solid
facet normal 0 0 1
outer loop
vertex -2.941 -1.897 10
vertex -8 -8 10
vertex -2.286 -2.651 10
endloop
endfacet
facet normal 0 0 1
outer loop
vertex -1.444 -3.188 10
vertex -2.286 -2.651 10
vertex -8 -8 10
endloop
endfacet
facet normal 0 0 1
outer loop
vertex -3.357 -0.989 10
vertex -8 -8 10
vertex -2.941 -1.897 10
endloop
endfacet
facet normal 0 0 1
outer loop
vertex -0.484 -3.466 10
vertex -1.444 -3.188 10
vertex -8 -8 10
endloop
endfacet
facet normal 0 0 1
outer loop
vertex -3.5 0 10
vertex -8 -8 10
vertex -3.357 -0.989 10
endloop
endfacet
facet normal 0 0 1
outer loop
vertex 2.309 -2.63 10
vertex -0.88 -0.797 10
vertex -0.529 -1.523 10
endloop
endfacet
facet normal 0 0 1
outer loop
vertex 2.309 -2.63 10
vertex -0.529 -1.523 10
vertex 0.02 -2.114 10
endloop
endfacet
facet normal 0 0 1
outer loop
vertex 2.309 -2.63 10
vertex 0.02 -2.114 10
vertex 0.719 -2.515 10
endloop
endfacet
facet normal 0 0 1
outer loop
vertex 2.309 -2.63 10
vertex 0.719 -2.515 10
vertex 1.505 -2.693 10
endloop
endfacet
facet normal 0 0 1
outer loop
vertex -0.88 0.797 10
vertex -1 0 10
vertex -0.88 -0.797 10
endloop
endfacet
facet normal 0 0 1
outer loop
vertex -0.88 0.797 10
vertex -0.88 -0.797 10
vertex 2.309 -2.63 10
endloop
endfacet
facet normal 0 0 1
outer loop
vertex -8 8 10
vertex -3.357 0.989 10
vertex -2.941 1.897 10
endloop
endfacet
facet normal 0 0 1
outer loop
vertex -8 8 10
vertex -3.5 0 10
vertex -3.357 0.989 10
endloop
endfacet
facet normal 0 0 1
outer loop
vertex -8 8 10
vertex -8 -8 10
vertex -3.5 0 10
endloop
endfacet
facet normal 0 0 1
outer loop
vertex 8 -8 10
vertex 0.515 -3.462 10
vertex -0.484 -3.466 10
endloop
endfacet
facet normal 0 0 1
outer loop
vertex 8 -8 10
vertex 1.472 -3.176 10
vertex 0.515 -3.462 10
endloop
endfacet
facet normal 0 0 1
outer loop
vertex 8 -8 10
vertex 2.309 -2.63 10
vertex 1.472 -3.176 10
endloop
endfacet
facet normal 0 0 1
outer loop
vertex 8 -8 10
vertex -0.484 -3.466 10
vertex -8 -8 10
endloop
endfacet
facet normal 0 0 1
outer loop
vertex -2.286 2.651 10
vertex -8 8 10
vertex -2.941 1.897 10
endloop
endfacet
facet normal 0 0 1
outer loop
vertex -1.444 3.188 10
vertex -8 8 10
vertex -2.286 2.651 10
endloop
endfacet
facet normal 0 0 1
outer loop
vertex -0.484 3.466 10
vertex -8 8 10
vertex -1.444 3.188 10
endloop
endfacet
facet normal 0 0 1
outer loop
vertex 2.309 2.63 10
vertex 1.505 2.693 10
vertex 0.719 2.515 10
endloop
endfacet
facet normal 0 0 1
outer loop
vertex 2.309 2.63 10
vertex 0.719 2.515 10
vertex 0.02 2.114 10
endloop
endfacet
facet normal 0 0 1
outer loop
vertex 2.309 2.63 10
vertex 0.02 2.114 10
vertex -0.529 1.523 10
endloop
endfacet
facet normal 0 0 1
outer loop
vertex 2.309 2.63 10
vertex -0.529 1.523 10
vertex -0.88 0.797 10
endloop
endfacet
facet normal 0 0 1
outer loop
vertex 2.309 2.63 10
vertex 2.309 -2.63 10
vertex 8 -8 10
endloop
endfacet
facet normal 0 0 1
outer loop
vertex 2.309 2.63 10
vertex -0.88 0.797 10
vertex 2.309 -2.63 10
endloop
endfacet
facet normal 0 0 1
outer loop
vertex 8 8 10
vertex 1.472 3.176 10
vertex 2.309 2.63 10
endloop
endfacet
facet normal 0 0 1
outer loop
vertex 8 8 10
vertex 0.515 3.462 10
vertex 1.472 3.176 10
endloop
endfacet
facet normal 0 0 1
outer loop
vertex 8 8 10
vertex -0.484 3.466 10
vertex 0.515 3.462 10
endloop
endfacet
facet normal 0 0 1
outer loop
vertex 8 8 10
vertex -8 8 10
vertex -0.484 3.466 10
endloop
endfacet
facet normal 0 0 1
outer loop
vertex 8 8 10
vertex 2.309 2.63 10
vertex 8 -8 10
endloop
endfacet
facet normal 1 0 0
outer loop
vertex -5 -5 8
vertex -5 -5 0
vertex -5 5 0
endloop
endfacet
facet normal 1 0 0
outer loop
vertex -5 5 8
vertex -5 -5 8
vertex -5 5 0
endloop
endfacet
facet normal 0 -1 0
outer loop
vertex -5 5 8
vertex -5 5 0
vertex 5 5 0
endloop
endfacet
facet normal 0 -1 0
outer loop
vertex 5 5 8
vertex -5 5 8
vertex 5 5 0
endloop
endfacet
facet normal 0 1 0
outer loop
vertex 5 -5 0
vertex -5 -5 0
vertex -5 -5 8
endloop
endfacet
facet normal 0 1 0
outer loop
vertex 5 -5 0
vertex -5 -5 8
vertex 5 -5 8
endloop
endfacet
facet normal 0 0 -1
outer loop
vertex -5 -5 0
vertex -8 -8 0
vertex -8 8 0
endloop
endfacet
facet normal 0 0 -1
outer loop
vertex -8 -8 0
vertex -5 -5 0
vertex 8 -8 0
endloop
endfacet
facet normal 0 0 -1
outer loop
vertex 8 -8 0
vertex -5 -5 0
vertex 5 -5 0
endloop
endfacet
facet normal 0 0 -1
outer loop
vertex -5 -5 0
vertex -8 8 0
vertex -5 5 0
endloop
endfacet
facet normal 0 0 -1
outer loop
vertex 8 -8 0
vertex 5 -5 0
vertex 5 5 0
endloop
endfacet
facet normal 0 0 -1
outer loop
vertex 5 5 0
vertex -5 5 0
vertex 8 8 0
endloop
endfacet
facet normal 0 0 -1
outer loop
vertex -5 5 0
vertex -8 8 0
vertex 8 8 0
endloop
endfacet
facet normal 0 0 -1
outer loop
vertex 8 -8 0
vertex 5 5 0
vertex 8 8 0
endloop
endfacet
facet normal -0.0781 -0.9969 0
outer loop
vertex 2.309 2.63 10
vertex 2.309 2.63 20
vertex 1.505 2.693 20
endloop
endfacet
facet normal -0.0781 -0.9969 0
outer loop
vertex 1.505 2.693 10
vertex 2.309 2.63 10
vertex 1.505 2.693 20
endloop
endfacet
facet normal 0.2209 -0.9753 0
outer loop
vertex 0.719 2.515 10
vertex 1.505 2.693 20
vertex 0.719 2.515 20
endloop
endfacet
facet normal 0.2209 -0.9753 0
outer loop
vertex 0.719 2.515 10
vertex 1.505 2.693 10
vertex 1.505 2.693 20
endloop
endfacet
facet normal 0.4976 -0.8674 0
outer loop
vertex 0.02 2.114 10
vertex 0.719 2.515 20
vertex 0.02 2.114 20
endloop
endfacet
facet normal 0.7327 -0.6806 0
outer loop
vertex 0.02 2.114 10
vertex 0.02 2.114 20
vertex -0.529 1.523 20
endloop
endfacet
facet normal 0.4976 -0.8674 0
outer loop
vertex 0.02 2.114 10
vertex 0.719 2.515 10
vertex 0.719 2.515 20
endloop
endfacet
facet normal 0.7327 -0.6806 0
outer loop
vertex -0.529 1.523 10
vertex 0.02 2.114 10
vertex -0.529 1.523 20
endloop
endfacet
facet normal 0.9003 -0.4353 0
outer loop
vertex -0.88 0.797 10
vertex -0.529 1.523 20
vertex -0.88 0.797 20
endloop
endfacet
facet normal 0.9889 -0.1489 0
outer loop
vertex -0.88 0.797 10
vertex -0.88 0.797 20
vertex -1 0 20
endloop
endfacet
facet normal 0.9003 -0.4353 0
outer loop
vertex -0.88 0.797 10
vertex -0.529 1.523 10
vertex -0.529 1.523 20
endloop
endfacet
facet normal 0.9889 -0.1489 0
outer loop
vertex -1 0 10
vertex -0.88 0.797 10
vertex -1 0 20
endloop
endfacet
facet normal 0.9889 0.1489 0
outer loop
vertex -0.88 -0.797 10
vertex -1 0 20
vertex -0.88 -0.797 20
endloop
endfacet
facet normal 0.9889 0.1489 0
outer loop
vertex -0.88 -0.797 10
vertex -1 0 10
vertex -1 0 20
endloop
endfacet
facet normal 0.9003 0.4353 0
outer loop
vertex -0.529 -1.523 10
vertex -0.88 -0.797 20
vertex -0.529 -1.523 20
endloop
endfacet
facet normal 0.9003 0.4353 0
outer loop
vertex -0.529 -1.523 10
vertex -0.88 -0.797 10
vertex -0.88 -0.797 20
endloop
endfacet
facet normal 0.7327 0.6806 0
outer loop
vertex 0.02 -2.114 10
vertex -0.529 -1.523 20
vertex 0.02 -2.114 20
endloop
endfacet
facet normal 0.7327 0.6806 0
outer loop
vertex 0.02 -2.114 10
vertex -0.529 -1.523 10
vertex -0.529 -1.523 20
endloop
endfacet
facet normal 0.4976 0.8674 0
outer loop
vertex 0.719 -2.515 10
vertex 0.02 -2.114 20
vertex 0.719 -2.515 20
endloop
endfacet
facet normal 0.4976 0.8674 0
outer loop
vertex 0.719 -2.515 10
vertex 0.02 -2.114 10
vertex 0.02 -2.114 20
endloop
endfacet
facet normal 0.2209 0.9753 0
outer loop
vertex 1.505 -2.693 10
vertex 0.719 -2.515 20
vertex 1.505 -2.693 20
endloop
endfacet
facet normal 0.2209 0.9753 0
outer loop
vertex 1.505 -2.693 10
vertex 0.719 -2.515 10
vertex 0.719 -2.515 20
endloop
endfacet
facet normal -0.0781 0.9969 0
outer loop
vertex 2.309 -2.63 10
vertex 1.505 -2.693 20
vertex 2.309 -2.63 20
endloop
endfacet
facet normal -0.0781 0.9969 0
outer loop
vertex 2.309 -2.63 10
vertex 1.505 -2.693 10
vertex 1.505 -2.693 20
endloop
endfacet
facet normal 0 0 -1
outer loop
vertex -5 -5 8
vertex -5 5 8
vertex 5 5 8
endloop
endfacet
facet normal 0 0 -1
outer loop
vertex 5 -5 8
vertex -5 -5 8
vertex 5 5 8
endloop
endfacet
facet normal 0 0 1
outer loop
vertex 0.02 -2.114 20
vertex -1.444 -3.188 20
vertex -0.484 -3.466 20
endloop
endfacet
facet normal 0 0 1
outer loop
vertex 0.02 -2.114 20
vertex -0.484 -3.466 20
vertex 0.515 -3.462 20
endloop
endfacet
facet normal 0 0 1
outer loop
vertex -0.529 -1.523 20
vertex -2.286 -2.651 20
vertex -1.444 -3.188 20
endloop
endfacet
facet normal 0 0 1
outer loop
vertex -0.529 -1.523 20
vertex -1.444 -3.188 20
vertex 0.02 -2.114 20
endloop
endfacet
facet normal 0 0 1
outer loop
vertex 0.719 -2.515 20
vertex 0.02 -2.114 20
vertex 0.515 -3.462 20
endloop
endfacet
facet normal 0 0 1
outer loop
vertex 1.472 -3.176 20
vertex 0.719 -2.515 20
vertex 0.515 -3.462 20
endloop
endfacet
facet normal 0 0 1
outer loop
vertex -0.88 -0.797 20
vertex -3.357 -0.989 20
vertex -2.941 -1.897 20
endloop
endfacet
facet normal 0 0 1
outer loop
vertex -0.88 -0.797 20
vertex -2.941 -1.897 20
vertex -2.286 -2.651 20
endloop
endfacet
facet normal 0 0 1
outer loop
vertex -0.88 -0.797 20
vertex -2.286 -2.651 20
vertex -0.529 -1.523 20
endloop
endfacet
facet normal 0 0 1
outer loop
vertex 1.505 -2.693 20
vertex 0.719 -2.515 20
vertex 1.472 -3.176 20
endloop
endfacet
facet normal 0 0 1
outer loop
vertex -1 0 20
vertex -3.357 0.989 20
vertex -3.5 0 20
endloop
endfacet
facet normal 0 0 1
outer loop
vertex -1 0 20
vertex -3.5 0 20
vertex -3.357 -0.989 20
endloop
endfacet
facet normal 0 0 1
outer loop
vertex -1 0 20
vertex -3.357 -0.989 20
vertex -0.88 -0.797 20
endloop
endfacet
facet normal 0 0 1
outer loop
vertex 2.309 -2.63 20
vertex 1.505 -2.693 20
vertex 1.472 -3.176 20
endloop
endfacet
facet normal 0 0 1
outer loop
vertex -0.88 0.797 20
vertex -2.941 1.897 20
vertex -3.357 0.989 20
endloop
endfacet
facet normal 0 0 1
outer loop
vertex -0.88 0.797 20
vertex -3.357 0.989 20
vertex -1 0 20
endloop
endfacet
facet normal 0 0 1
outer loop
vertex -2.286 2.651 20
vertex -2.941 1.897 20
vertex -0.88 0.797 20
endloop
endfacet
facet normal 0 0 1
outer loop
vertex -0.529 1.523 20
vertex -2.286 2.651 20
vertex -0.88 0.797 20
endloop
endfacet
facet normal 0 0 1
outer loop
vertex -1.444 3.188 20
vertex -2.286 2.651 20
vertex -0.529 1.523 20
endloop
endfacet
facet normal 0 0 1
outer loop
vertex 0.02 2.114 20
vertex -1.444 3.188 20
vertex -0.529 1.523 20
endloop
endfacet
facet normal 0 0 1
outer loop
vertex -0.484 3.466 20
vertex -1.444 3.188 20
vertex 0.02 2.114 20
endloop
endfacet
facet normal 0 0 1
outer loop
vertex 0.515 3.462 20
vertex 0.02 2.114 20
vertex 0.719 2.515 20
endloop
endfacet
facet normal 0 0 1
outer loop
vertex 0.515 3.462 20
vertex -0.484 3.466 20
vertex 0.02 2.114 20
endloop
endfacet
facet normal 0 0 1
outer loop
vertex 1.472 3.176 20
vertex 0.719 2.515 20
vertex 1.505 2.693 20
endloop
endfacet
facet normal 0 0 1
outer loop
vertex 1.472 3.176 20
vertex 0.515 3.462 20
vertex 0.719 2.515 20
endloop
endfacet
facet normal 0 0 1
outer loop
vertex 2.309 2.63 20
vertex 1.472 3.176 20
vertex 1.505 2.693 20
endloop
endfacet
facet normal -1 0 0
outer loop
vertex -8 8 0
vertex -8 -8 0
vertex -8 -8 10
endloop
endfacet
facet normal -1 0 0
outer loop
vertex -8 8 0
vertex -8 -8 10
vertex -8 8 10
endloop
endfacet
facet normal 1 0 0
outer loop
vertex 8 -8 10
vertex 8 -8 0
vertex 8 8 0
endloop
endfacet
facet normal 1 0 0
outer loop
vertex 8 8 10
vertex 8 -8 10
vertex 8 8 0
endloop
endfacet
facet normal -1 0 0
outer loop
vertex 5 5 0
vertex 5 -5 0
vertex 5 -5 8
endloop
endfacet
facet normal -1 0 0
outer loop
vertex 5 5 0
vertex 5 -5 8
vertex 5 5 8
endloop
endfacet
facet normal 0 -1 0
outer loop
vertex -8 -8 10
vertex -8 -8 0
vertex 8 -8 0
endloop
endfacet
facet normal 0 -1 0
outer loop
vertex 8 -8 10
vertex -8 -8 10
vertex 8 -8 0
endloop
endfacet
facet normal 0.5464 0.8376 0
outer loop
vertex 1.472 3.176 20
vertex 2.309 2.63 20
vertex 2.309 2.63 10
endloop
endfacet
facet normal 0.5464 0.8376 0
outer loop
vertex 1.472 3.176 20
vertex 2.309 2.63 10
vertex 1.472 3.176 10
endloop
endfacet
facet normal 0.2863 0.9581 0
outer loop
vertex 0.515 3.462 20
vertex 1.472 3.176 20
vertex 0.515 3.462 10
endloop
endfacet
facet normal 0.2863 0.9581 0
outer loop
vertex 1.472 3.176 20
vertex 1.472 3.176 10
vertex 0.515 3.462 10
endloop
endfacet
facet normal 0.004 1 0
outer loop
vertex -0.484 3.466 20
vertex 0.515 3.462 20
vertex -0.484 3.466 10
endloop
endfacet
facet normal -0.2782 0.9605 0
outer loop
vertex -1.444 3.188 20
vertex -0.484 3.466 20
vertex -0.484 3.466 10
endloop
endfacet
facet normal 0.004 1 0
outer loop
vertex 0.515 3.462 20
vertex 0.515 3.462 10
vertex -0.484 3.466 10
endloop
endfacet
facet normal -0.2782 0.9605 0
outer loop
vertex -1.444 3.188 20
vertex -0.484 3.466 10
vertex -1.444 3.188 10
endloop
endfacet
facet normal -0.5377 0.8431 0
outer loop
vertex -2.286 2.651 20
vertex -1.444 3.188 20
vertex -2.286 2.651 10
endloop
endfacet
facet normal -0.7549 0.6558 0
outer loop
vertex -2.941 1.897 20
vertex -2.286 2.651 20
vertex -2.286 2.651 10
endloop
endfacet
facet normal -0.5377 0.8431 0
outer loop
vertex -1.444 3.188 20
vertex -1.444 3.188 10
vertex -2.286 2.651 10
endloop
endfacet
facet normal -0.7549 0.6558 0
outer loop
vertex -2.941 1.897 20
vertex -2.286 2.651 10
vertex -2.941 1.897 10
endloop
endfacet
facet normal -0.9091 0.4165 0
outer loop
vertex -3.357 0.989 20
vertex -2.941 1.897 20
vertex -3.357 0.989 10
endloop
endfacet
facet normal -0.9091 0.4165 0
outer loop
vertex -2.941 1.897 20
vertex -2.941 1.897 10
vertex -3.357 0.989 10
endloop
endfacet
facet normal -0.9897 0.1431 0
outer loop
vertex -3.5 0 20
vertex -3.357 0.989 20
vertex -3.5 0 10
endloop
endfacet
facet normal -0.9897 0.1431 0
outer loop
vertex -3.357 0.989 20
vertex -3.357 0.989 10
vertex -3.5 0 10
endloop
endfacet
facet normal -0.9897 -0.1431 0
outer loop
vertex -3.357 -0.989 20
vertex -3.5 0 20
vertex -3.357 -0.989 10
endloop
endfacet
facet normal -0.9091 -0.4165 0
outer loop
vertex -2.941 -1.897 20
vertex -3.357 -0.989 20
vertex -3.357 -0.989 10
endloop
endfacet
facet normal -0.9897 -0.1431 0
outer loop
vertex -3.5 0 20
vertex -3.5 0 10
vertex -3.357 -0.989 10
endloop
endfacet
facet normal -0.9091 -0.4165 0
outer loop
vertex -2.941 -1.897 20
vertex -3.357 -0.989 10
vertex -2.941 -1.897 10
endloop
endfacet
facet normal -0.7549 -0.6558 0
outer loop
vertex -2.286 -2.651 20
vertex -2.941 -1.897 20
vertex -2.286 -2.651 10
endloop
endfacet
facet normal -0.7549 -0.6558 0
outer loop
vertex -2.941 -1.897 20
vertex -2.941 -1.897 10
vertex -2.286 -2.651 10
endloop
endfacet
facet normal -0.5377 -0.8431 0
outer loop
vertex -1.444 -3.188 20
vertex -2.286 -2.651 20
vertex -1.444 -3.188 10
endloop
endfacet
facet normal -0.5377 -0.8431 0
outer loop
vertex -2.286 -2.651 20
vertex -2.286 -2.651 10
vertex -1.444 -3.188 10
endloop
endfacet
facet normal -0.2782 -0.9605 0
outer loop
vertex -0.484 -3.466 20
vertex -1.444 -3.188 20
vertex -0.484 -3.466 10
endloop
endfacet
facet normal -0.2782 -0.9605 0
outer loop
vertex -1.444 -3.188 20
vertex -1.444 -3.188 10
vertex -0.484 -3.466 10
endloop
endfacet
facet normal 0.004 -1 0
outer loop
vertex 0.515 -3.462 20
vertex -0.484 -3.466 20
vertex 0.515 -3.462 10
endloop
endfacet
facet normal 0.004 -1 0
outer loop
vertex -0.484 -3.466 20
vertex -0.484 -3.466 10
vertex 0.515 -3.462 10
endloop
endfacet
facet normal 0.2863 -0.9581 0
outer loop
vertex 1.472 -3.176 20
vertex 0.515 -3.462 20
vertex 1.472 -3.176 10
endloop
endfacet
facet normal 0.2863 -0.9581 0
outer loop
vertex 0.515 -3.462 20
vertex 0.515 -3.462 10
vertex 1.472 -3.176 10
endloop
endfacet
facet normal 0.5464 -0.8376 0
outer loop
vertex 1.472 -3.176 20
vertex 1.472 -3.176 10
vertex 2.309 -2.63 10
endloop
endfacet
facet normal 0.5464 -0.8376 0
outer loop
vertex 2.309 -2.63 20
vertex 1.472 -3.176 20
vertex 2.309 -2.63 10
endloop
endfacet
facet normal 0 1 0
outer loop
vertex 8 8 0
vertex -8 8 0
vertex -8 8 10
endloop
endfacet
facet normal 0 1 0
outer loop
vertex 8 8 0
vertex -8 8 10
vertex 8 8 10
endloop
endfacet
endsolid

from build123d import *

# Parameters (mm, degrees)
BOX001_W          = 10
BOX001_H          = 10
BOX001_DEPTH      = 8
CYLINDER_R        = 2.7
CYLINDER_DEPTH    = 10
CYLINDER001_R     = 3.5
CYLINDER001_DEPTH = 10
BOX_W             = 16
BOX_H             = 16
BOX_DEPTH         = 10


with BuildPart() as cube001:
    # Box001 → Box001 (new body)
    with BuildSketch(Plane(origin=(-5, -5, 0), x_dir=(1, 0, 0), z_dir=(0, 0, 1))):
        with Locations((5, 5)):
            Rectangle(BOX001_W, BOX001_H)
    extrude(amount=BOX001_DEPTH)


with BuildPart() as cylinder:
    # Cylinder → Cylinder (new body)
    with BuildSketch(Plane(origin=(1.7, 0, 10), x_dir=(1, 0, 0), z_dir=(0, 0, 1))):
        Circle(CYLINDER_R)
    extrude(amount=CYLINDER_DEPTH)


with BuildPart() as cut:
    # Cylinder001 → Cylinder001 (new body)
    with BuildSketch(Plane.XY.offset(10)):
        Circle(CYLINDER001_R)
    extrude(amount=CYLINDER001_DEPTH)

    # Cut: cut Cylinder
    add(cylinder.part, mode=Mode.SUBTRACT)


with BuildPart() as cut001:
    # Box → Box (new body)
    with BuildSketch(Plane(origin=(-8, -8, 0), x_dir=(1, 0, 0), z_dir=(0, 0, 1))):
        with Locations((8, 8)):
            Rectangle(BOX_W, BOX_H)
    extrude(amount=BOX_DEPTH)

    # Fusion: union Cut
    add(cut.part)

    # Cut001: cut Cube001
    add(cube001.part, mode=Mode.SUBTRACT)


solid = cut001.part
